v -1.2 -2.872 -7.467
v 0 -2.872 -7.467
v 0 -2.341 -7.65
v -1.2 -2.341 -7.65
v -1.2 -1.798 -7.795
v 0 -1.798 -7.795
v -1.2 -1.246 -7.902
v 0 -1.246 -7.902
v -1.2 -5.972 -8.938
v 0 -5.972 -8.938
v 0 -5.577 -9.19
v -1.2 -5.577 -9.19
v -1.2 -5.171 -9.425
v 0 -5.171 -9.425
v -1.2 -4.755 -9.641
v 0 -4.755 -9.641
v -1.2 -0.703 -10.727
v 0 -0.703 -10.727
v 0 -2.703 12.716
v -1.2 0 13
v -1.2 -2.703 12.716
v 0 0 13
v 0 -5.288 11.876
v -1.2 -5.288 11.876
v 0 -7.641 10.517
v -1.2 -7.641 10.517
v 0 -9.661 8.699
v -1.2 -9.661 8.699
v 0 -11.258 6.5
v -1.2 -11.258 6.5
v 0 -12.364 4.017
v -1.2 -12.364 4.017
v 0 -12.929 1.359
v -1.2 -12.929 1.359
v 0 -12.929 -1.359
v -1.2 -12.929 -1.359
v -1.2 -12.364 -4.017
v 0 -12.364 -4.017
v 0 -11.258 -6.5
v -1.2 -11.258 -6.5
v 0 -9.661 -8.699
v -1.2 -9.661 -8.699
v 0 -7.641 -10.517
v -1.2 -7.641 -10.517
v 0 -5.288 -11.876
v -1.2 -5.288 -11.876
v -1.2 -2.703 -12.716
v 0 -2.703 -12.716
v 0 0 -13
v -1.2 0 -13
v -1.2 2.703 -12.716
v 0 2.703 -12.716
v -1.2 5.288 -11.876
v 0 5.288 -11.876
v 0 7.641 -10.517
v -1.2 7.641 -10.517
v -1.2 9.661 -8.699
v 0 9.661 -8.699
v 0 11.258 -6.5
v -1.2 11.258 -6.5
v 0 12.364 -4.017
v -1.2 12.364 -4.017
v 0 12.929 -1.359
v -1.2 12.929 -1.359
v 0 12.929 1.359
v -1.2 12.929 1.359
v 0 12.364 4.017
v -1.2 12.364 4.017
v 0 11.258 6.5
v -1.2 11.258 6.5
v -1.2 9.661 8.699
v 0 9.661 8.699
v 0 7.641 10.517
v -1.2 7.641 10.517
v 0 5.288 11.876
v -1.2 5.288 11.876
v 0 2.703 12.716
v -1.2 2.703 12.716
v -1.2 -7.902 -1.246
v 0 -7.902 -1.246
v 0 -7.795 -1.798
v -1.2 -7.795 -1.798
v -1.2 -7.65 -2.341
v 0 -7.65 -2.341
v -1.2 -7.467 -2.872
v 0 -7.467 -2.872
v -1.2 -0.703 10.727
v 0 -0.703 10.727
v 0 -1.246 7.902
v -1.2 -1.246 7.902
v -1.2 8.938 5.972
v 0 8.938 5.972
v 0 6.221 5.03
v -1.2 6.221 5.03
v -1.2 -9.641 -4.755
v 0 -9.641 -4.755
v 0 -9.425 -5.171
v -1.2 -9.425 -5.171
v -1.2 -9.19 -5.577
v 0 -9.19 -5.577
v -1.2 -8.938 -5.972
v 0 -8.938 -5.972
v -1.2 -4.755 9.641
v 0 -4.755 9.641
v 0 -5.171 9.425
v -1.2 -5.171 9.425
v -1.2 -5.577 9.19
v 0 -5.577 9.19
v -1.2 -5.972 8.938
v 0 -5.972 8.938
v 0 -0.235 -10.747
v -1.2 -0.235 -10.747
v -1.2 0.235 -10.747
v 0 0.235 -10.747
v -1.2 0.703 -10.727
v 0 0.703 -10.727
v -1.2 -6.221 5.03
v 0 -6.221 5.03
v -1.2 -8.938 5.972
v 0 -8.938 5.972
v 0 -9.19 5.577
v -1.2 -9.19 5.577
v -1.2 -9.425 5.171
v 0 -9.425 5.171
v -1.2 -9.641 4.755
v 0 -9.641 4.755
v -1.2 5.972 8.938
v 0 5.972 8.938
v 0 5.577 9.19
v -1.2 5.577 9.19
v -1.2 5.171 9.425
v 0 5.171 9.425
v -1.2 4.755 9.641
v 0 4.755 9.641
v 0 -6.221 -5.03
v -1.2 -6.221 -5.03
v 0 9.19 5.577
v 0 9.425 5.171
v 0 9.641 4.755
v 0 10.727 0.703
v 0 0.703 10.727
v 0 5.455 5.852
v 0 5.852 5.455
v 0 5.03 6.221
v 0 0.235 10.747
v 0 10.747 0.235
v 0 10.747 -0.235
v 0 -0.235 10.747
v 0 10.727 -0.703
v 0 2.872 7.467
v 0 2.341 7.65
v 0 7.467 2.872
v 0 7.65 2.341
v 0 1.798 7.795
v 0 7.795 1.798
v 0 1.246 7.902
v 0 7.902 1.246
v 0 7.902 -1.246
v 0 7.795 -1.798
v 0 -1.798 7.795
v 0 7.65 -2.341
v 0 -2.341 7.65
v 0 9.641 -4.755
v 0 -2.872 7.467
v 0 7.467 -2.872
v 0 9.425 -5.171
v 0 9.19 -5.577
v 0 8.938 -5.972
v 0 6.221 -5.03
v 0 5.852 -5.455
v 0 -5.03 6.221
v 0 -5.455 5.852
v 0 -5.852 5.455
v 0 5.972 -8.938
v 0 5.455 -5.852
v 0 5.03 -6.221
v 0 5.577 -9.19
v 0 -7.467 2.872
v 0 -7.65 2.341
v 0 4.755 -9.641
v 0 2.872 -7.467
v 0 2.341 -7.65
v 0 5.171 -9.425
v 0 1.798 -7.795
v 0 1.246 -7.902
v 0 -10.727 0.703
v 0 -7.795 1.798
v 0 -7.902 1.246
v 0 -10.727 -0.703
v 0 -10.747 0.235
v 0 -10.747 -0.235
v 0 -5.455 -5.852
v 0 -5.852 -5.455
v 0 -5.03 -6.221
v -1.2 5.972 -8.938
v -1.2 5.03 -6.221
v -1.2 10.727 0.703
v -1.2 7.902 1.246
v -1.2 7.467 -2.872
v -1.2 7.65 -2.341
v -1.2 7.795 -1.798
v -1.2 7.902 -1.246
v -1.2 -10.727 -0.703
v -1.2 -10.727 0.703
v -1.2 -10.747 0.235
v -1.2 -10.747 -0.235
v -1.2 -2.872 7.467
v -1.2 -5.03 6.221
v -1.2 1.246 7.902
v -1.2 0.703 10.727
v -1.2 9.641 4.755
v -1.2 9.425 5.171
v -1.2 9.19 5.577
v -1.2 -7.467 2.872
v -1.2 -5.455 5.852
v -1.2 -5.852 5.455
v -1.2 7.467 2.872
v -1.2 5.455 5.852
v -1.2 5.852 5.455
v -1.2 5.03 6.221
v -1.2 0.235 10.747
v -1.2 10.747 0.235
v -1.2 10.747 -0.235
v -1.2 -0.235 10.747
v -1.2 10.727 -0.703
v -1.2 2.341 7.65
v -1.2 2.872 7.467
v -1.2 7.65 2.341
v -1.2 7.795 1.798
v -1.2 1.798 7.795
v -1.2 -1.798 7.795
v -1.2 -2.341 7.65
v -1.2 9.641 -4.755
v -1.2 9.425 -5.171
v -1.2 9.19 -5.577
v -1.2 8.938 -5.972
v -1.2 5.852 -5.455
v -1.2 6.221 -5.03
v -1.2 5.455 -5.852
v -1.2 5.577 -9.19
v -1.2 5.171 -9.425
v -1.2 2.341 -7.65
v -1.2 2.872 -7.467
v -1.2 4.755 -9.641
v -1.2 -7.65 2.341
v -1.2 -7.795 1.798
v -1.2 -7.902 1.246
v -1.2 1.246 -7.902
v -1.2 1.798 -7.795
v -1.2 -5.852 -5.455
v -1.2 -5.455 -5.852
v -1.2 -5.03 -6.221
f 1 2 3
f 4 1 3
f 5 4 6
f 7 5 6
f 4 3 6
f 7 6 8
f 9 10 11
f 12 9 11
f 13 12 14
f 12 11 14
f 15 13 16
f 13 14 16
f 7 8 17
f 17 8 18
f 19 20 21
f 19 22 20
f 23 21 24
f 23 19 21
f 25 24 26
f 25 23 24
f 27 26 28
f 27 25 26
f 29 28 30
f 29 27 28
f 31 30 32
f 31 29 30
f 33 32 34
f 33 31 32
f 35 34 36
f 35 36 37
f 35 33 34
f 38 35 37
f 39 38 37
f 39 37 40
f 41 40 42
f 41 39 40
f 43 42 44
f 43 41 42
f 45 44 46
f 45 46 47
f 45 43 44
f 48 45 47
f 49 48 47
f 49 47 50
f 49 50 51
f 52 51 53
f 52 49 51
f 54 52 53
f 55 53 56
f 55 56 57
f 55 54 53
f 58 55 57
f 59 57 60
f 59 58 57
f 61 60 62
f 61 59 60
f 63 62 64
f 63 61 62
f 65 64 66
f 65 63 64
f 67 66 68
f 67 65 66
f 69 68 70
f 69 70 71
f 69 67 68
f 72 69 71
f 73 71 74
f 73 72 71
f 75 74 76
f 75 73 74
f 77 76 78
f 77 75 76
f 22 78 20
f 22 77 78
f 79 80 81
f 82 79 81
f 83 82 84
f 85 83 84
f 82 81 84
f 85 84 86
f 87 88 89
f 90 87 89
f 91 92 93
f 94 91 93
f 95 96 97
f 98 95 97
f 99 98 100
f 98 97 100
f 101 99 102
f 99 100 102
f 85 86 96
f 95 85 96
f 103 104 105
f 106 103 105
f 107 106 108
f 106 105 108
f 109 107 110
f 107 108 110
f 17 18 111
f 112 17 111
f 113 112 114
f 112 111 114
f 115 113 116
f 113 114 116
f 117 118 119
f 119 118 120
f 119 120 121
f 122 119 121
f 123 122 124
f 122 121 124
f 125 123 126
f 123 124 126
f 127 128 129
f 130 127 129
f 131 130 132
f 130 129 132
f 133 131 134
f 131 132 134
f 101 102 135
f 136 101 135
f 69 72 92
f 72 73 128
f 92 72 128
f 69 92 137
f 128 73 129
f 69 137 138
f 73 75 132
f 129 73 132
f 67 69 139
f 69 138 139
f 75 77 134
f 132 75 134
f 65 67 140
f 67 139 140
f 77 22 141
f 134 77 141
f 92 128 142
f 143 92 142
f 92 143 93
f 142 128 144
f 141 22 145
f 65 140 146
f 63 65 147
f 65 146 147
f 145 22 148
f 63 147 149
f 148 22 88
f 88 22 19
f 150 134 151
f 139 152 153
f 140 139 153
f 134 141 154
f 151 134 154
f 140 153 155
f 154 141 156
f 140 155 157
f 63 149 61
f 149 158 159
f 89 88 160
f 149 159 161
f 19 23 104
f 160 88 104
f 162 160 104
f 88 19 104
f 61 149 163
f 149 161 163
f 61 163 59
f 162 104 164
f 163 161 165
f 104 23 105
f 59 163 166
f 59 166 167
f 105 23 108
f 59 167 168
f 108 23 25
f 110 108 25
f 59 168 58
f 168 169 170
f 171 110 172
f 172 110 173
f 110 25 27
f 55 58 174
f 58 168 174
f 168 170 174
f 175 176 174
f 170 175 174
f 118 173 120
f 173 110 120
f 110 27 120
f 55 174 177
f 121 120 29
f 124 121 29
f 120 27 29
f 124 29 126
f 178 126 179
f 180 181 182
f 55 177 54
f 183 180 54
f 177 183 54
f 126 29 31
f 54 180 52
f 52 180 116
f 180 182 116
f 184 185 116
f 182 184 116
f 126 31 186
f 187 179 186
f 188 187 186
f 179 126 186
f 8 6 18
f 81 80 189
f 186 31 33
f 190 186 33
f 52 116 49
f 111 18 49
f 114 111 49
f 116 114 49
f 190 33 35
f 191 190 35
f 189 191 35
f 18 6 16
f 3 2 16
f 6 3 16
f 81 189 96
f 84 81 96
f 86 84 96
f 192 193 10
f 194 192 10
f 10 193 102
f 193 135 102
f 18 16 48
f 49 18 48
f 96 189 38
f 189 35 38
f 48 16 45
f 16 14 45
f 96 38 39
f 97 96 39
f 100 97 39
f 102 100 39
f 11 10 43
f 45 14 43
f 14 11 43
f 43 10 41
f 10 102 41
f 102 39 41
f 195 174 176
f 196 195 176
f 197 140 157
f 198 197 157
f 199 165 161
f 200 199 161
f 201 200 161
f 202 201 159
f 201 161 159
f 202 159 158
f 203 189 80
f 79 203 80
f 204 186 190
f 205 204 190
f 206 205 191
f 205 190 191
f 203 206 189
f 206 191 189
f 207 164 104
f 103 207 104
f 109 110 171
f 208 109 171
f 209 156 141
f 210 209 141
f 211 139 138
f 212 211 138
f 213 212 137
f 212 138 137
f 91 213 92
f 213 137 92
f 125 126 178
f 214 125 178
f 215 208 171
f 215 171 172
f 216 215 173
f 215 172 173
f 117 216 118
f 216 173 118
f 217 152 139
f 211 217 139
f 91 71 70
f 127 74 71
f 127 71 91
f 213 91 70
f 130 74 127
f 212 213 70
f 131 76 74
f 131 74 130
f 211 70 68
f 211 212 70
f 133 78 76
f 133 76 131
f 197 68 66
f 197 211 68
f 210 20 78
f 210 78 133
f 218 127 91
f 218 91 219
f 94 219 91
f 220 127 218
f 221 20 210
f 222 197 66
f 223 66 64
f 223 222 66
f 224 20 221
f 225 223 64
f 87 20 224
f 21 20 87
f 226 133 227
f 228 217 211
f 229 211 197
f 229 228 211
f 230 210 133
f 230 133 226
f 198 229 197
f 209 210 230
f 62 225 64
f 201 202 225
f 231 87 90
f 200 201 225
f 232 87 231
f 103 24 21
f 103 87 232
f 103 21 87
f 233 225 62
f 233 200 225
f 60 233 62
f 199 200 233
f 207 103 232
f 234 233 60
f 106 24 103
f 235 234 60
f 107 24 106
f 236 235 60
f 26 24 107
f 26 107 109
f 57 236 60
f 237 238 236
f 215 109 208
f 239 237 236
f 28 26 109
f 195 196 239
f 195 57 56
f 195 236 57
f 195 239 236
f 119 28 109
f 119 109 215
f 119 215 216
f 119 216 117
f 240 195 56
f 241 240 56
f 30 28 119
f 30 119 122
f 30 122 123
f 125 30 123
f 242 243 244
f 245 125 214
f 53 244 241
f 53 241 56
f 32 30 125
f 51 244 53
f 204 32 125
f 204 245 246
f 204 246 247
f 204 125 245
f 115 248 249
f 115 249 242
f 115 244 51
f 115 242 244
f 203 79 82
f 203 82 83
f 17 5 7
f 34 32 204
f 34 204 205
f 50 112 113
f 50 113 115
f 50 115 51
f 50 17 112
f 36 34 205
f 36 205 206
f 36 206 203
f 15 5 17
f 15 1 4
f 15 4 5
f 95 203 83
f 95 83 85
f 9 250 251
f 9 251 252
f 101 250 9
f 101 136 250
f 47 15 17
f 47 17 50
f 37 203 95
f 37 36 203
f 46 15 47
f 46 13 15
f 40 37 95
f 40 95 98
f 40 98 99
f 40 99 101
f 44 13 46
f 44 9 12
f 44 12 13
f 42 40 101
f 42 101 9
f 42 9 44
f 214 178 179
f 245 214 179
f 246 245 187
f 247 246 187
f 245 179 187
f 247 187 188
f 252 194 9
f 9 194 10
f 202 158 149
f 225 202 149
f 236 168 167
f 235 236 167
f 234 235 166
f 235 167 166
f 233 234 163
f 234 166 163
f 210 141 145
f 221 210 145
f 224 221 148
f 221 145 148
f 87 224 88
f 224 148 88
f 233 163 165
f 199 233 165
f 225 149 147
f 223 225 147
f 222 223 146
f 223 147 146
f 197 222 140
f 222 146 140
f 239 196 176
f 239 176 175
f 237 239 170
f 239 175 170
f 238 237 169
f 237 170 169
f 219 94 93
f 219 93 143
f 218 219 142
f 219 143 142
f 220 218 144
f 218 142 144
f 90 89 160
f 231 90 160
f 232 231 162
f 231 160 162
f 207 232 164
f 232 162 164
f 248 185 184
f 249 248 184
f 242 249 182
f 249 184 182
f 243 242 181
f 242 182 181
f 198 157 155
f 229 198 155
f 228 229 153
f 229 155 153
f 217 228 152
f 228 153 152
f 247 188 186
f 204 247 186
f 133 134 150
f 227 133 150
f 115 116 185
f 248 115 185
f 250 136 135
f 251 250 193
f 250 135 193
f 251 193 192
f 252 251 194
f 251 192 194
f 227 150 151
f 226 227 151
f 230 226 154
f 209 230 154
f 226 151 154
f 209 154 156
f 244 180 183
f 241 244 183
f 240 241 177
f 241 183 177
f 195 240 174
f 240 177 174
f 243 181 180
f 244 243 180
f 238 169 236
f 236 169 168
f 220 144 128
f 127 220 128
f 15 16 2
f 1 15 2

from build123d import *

# Parameters (mm, degrees)
SECSKE_W      = 1.2
SECSKE_H      = 5
INTCUT_DEPTH  = 19.423897525
INTCUTS_COUNT = 12
INTCUTS_ANGLE = 330


with BuildPart() as part:
    # SecSke → Body (revolve)
    with BuildSketch(Plane.XY, mode=Mode.PRIVATE) as body_sk:
        with Locations((-0.6, 10.5)):
            Rectangle(SECSKE_W, SECSKE_H)
    revolve(body_sk.sketch.rotate(Axis((-34.925, 0, 0), (1, 0, 0)), 90), axis=Axis((-34.925, 0, 0), (1, 0, 0)))

    # IntCutSke → IntCut (cut, through all)
    with BuildSketch(Plane(origin=(0, 0, 0), x_dir=(0, 0, -1), z_dir=(1, 0, 0))):
        with BuildLine():
            Line((-0.703083639, 10.726983425), (-1.326257139, 7.483384395))
            ThreePointArc((-1.326257139, 7.483384395), (0, 7.6), (1.326257139, 7.483384395))
            Line((1.326257139, 7.483384395), (0.703083639, 10.726983425))
            ThreePointArc((0.703083639, 10.726983425), (0, 10.75), (-0.703083639, 10.726983425))
        make_face()
    intcut = extrude(amount=-INTCUT_DEPTH, mode=Mode.SUBTRACT)

    # IntCuts: IntCut ×12 about axis
    intcuts_axis = Axis((-34.925, 0, 0), (1, 0, 0))
    for i in range(1, INTCUTS_COUNT):
        add(intcut.rotate(intcuts_axis, i * INTCUTS_ANGLE / (INTCUTS_COUNT - 1)), mode=Mode.SUBTRACT)


solid = part.part
